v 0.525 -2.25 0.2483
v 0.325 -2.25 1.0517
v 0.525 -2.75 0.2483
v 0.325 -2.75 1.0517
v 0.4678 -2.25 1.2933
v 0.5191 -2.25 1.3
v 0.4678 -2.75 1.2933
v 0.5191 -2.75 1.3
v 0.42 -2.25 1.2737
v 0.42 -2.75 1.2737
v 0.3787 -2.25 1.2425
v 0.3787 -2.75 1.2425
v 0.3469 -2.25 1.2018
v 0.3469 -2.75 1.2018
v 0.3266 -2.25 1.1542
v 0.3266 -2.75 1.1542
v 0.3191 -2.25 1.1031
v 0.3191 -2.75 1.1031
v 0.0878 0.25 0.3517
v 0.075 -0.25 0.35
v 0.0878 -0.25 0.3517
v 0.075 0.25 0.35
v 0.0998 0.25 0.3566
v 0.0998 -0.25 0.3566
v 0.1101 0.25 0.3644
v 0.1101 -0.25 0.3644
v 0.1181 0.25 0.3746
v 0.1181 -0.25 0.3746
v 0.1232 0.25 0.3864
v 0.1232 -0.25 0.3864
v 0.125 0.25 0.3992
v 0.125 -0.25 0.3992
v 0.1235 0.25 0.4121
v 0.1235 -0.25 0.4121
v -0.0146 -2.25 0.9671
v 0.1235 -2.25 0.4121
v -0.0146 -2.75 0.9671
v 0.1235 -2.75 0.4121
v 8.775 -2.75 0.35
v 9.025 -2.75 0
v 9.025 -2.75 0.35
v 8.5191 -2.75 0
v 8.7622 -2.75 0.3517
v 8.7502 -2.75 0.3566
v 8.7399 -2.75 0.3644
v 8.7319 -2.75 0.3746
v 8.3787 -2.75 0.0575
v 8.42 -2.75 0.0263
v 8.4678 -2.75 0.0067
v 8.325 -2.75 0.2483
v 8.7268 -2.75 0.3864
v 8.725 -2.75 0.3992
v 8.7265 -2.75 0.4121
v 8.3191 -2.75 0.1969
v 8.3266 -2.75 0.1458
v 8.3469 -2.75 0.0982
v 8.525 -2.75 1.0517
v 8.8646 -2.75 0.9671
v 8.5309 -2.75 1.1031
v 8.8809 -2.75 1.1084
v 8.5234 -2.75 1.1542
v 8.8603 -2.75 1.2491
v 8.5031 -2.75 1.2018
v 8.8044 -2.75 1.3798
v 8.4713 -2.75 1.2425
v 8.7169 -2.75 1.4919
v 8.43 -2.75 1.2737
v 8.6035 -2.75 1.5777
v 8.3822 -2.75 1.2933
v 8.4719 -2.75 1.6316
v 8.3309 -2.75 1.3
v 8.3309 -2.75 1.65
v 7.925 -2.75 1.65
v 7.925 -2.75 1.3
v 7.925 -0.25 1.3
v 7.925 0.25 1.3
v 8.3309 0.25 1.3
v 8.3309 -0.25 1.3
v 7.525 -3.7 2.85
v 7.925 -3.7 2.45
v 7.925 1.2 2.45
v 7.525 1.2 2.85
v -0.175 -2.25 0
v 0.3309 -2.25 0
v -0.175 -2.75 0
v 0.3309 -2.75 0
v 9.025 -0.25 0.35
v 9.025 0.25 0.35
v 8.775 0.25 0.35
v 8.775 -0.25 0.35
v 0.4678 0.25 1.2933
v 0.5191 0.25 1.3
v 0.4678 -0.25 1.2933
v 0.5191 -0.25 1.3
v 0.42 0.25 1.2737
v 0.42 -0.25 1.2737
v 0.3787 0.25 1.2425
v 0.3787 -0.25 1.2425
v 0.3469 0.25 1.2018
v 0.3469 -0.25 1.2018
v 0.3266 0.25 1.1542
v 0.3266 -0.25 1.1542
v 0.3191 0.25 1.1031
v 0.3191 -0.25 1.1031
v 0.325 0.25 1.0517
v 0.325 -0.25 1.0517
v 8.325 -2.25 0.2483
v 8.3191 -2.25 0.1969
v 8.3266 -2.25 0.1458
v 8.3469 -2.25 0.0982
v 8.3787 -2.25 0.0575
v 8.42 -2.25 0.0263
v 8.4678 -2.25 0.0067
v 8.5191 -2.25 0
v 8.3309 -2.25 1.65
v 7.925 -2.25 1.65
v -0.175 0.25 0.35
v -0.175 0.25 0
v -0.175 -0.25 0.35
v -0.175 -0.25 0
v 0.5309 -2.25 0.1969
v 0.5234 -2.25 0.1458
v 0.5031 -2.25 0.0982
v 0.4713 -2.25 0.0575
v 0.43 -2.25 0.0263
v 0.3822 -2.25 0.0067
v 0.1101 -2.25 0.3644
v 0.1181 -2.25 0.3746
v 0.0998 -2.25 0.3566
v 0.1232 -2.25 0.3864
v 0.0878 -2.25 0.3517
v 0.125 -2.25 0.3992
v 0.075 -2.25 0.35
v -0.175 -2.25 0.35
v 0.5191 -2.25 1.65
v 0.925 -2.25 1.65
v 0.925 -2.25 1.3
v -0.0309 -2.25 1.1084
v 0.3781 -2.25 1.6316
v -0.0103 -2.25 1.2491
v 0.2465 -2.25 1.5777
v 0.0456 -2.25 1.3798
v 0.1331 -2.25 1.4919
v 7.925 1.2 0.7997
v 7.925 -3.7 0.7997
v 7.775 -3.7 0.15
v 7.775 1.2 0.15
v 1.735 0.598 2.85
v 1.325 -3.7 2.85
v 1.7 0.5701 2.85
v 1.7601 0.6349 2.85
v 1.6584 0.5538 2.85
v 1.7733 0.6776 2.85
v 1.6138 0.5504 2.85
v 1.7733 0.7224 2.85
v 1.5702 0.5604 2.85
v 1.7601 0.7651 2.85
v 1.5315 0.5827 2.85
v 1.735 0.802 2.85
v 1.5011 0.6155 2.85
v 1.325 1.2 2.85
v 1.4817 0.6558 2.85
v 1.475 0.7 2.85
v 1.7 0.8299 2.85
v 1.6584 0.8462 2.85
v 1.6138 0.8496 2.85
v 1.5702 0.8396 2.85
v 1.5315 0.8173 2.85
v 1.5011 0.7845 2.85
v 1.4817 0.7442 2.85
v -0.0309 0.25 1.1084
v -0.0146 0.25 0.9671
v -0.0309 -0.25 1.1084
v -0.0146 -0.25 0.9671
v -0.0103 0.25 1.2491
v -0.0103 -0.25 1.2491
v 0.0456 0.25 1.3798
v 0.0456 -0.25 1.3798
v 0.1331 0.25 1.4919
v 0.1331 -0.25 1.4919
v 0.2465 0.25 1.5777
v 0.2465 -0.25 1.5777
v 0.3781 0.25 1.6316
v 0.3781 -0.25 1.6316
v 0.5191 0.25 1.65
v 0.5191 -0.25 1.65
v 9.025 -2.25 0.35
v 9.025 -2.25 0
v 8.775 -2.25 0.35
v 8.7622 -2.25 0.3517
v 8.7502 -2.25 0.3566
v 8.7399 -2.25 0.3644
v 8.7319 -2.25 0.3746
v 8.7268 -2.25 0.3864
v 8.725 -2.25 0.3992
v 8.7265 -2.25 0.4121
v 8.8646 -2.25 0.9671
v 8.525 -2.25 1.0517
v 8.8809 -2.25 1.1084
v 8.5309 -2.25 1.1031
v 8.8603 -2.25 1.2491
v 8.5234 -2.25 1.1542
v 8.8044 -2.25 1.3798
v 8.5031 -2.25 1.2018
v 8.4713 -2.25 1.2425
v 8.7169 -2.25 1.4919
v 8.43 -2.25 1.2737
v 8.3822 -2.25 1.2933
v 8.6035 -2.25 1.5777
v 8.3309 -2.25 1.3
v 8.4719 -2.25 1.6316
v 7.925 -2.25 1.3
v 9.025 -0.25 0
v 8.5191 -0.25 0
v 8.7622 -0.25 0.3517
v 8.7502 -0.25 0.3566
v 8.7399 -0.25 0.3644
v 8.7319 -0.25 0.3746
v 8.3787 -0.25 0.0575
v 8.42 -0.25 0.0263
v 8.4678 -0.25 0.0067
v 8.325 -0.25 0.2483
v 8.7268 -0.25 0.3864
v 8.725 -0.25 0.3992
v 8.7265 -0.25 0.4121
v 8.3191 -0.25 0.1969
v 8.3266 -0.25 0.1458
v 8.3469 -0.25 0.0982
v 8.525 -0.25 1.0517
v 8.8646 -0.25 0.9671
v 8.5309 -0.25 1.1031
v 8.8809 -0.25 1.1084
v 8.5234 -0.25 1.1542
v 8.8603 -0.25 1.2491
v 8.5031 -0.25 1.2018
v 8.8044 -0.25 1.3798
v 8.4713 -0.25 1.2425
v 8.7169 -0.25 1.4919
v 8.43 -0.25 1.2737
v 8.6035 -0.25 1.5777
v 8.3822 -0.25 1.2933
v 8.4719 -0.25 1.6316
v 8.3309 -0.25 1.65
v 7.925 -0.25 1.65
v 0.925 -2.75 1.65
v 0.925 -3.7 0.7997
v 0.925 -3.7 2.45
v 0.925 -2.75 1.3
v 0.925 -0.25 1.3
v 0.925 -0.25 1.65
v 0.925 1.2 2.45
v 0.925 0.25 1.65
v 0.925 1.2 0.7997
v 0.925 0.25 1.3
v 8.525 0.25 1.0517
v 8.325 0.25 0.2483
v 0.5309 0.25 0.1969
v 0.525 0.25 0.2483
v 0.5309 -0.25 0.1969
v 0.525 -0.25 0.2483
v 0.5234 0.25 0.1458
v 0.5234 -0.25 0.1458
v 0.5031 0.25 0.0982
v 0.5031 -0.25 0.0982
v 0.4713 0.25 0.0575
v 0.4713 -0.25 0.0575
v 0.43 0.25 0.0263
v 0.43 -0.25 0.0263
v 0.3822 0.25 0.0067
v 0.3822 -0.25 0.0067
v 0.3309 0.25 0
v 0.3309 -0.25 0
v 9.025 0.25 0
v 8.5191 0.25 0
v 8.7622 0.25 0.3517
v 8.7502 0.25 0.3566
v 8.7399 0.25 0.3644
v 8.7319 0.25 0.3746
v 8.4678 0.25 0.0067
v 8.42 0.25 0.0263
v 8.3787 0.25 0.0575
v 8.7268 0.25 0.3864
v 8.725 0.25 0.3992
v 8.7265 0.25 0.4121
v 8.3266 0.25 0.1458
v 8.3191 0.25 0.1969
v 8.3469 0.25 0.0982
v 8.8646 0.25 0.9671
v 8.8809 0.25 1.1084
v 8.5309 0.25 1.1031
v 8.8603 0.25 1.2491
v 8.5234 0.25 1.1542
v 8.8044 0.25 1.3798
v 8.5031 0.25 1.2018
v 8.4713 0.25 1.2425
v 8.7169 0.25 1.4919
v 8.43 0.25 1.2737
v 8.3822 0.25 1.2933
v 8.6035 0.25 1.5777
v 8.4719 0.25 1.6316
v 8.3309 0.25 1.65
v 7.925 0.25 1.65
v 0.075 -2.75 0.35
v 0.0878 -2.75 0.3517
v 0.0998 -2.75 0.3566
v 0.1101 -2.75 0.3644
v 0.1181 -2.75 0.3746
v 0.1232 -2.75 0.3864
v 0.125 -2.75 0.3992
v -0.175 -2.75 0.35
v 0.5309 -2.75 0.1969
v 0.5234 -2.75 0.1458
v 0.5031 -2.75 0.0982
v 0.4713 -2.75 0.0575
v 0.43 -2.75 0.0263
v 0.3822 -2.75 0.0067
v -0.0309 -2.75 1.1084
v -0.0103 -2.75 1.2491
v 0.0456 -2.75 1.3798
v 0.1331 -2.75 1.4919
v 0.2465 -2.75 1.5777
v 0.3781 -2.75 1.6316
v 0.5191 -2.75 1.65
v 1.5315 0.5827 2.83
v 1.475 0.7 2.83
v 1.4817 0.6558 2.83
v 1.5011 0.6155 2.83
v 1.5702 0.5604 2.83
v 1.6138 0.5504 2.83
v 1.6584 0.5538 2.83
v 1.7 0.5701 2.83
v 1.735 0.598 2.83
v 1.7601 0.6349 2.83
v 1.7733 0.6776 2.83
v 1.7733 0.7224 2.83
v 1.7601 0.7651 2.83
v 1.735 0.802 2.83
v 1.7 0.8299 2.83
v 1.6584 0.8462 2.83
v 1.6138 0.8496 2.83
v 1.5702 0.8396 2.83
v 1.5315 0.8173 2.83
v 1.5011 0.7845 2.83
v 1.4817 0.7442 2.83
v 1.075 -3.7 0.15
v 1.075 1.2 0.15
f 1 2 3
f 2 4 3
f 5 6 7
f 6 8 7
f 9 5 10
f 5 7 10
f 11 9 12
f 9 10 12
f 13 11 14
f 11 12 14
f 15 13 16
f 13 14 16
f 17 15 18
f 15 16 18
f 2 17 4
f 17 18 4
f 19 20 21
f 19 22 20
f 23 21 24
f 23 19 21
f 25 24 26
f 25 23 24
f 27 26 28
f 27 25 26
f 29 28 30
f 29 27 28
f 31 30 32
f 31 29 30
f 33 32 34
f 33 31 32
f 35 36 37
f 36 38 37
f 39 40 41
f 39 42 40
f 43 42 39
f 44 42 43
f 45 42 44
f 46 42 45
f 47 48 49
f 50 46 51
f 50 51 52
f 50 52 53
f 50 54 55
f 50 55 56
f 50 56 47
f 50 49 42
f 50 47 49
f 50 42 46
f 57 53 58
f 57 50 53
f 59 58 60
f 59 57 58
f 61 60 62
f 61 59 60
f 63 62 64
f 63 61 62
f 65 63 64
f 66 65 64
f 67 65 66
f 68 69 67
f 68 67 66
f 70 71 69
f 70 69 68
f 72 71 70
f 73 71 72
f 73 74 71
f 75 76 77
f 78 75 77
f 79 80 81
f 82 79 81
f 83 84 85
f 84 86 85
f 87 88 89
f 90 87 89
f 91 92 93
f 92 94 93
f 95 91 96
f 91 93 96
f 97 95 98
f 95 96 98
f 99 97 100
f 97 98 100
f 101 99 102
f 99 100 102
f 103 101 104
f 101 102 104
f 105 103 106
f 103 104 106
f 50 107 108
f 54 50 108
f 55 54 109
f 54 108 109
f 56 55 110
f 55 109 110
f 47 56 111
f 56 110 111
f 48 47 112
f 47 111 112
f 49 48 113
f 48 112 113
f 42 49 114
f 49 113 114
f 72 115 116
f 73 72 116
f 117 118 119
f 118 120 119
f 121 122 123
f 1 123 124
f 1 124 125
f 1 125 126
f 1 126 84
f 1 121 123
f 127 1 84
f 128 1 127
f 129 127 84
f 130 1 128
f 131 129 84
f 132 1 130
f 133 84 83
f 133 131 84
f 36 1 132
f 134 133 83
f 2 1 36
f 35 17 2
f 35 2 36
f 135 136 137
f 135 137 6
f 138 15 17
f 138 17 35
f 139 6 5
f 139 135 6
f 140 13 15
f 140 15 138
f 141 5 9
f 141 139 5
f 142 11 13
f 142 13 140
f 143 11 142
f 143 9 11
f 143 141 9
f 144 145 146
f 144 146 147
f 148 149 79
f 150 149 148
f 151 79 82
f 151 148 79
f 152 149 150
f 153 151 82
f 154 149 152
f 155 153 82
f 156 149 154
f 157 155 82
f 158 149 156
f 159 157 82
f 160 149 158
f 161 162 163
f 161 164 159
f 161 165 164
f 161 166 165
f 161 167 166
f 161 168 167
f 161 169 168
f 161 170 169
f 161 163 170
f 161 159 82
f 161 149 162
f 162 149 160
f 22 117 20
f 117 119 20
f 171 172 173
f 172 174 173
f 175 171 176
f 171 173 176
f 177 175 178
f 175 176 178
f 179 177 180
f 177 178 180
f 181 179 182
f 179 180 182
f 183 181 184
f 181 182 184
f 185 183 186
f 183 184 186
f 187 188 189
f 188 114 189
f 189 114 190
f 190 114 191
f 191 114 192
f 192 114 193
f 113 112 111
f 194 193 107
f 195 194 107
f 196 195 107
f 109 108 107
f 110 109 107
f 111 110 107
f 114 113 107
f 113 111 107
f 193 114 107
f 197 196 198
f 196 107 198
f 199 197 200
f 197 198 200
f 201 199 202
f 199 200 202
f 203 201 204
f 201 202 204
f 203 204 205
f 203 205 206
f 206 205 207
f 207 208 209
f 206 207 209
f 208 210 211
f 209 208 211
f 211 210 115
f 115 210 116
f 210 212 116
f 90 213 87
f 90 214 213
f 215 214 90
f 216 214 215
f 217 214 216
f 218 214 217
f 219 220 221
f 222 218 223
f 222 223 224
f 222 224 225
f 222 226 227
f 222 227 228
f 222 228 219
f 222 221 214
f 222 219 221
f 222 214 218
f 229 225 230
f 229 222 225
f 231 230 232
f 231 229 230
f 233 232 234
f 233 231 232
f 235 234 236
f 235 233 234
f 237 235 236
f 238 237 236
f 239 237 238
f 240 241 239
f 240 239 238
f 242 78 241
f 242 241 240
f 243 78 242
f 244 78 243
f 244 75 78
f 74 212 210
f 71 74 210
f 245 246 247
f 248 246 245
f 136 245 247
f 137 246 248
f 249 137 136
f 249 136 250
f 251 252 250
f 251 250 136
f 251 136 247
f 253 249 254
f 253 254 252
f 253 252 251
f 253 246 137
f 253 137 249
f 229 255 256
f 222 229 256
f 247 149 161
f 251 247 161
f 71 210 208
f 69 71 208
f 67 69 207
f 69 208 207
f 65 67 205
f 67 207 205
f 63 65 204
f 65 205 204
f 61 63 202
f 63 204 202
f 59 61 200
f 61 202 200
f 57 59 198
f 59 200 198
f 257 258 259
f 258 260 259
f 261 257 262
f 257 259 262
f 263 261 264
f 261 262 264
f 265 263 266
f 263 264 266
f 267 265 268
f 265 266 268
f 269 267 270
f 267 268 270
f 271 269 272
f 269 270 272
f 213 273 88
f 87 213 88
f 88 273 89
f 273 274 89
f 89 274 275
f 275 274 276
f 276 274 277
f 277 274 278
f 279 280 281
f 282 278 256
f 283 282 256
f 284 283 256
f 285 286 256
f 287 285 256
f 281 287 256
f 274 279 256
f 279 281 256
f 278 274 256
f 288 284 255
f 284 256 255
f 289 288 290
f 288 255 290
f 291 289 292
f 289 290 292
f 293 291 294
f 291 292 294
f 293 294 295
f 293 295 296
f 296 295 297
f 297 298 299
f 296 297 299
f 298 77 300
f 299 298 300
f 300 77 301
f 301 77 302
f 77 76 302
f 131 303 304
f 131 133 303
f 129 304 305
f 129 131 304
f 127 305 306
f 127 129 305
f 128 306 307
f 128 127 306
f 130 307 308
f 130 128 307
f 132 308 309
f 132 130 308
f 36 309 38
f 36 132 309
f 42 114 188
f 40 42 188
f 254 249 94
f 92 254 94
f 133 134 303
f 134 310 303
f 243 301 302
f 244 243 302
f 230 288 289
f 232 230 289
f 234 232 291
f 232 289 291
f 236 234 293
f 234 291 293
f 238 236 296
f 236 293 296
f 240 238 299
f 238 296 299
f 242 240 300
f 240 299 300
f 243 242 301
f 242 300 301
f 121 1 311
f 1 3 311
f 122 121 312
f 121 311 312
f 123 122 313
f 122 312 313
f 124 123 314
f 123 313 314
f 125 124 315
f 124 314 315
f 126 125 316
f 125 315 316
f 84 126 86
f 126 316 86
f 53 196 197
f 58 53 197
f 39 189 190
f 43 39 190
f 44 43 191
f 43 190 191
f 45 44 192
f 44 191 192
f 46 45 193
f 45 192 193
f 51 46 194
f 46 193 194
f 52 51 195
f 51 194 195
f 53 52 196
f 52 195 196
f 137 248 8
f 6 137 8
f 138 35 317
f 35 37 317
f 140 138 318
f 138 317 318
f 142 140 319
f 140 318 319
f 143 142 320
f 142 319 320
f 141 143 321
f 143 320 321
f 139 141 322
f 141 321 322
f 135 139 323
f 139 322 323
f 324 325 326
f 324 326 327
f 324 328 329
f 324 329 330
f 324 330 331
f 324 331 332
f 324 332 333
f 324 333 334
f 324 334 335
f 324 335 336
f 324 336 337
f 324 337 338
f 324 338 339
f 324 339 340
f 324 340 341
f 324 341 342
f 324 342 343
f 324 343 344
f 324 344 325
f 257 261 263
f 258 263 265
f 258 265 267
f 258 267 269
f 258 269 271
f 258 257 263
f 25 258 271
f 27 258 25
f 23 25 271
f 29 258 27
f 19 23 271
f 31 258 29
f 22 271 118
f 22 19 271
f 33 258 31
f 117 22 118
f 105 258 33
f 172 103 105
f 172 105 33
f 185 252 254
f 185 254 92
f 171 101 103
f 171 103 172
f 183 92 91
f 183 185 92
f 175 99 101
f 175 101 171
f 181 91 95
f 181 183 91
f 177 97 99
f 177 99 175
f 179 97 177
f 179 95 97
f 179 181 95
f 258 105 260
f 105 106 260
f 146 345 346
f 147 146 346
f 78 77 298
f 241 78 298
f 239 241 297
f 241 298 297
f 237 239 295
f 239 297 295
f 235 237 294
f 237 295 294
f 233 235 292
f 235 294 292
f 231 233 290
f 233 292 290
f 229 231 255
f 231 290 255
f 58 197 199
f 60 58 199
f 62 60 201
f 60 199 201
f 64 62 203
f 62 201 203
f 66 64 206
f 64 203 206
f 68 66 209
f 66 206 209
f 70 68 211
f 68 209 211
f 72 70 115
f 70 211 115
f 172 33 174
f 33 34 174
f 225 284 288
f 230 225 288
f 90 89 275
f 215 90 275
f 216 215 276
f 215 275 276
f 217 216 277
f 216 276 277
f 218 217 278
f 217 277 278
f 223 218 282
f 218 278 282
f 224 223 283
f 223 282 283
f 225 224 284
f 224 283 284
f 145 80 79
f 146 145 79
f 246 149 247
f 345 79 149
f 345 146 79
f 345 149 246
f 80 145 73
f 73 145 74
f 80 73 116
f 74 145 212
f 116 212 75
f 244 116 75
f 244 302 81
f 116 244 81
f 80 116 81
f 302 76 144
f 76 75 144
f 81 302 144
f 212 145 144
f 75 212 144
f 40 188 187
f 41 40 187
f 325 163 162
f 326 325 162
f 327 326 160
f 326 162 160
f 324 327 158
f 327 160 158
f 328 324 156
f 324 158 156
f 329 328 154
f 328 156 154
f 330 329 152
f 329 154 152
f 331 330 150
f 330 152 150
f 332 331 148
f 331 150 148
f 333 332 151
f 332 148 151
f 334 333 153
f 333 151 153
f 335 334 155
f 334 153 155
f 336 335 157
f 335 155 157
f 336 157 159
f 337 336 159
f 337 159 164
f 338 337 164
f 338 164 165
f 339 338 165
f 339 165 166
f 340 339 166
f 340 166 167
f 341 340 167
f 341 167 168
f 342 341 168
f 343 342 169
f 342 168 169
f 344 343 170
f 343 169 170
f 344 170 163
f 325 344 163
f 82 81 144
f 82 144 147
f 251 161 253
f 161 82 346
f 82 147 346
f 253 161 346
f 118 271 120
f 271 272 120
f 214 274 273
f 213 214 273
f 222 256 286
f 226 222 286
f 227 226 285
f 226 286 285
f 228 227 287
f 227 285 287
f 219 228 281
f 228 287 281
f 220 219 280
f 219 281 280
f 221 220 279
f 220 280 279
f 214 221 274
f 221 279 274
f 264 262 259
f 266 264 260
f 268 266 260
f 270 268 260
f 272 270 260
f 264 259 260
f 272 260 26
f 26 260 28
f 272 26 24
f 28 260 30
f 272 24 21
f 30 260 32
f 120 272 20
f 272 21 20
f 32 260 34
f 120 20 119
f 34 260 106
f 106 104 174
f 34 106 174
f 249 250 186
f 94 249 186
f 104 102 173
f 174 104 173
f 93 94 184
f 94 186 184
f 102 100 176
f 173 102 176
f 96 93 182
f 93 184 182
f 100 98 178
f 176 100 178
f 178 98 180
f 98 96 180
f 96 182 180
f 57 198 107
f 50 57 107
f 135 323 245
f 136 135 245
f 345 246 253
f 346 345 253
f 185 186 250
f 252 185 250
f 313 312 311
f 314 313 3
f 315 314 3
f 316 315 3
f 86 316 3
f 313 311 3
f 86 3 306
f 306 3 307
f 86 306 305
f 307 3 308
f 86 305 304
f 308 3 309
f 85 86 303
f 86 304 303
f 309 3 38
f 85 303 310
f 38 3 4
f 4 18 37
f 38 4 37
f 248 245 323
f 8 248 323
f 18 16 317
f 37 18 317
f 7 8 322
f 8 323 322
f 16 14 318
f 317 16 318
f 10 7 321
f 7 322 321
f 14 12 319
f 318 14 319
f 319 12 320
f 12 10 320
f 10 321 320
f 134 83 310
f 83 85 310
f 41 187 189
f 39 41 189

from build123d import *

# Parameters (mm, degrees)
SKETCH_2_W                     = 4.9
SKETCH_2_H                     = 7
EXTRUDE_1_DEPTH                = 2.7
EXTRUDE_2_DEPTH                = 0.25
FILLET_1_R                     = 0.05
CHAMFER_1_SIZE                 = 0.4
PATTERN_LINEAR_2_COUNT         = 2
PATTERN_LINEAR_2_PITCH         = 2.5
FILLET_1_OF_PATTERN_LINEAR_2_R = 0.05
MIRROR_START                   = -1.5
MIRROR_1_DEPTH                 = 0.5
MIRROR_START_2                 = 1
MIRROR_1_2_DEPTH               = 0.5
CHAMFER_2_SIZE                 = 0.4
CHAMFER_3_SIZE                 = 0.15
CHAMFER_3_SIZE2                = 0.649721381
CHAMFER_4_SIZE                 = 0.15
CHAMFER_4_SIZE2                = 0.649721381
SKETCH_7_R                     = 0.15
CUT_EXTRUDE_2_DEPTH            = 0.02
MOVE_BODY_2_ANGLE              = 120


with BuildPart() as part:
    # Эскиз2 → Бобышка-Вытянуть1 (new body)
    with BuildSketch(Plane(origin=(0, 0.15, 0), x_dir=(-1, 0, 0), z_dir=(0, 1, 0))):
        Rectangle(SKETCH_2_W, SKETCH_2_H)
    extrude(amount=EXTRUDE_1_DEPTH)

    # Эскиз4 → Вытянуть-Тонкостенный2 (add, symmetric)
    with BuildSketch(Plane(origin=(1.25, 0, 0), x_dir=(0, 0, -1), z_dir=(1, 0, 0))):
        with BuildLine():
            Line((-3.5, 1.3), (-3.905923723, 1.3))
            ThreePointArc((-3.905923723, 1.3), (-4.063504056, 1.223160215), (-4.1, 1.051684386))
            Line((-4.1, 1.051684386), (-3.9, 0.248315614))
            ThreePointArc((-3.9, 0.248315614), (-3.936495944, 0.076839785), (-4.094076277, 0))
            Line((-4.094076277, 0), (-4.6, 0))
            Line((-4.6, 0), (-4.6, 0.35))
            Line((-4.6, 0.35), (-4.285997426, 0.35))
            Line((-4.285997426, 0.35), (-4.439633485, 0.967132062))
            ThreePointArc((-4.439633485, 0.967132062), (-4.339269639, 1.438690592), (-3.905923723, 1.65))
            Line((-3.905923723, 1.65), (-3.5, 1.65))
            Line((-3.5, 1.65), (-3.5, 1.3))
        make_face()
    extrude_2 = extrude(amount=EXTRUDE_2_DEPTH, both=True)

    # Скругление1
    fillet_1_edges = [part.edges().sort_by_distance(p)[0] for p in [
        (1.25, 0.35, 4.285997426),
    ]]
    fillet(fillet_1_edges, radius=FILLET_1_R)

    # Фаска1
    chamfer_1_edges = [part.edges().sort_by_distance(p)[0] for p in [
        (0, 2.85, 3.5),
    ]]
    chamfer(chamfer_1_edges, length=CHAMFER_1_SIZE)

    # Линейный массив2: Вытянуть-Тонкостенный2 ×2
    with Locations(*[(-i * PATTERN_LINEAR_2_PITCH, 0, 0) for i in range(1, PATTERN_LINEAR_2_COUNT)]):
        add(extrude_2)

    # Скругление1 of Линейный массив2
    fillet_1_of_pattern_linear_2_edges = [part.edges().sort_by_distance(p)[0] for p in [
        (-1.25, 0.35, 4.285997426),
    ]]
    fillet(fillet_1_of_pattern_linear_2_edges, radius=FILLET_1_OF_PATTERN_LINEAR_2_R)

    # Зеркальное отражение1: read off the stored shape, not the designer's step
    # Зеркальное отражение1 outline → Зеркальное отражение1 (add)
    with BuildSketch(Plane.YZ.offset(MIRROR_START)):
        with BuildLine():
            Line((0, -4.6), (0.35, -4.6))
            Line((0.35, -4.6), (0.35, -4.349971142))
            ThreePointArc((0.35, -4.349971142), (0.369209946, -4.310576059), (0.412078903, -4.301452073))
            Line((0.412078903, -4.301452073), (0.967132062, -4.439633485))
            ThreePointArc((0.967132062, -4.439633485), (1.438690592, -4.339269639), (1.65, -3.905923723))
            Line((1.65, -3.905923723), (1.65, -3.5))
            Line((1.65, -3.5), (1.3, -3.5))
            Line((1.3, -3.5), (1.3, -3.905923723))
            ThreePointArc((1.3, -3.905923723), (1.223160215, -4.063504056), (1.051684386, -4.1))
            Line((1.051684386, -4.1), (0.248315614, -3.9))
            ThreePointArc((0.248315614, -3.9), (0.076839785, -3.936495944), (0, -4.094076277))
            Line((0, -4.094076277), (0, -4.6))
        make_face()
    extrude(amount=MIRROR_1_DEPTH)

    # Mirror 1 2 outline → Mirror 1 2 (add)
    with BuildSketch(Plane.YZ.offset(MIRROR_START_2)):
        with BuildLine():
            Line((0, -4.6), (0.35, -4.6))
            Line((0.35, -4.6), (0.35, -4.349971142))
            ThreePointArc((0.35, -4.349971142), (0.369209946, -4.310576059), (0.412078903, -4.301452073))
            Line((0.412078903, -4.301452073), (0.967132062, -4.439633485))
            ThreePointArc((0.967132062, -4.439633485), (1.438690592, -4.339269639), (1.65, -3.905923723))
            Line((1.65, -3.905923723), (1.65, -3.5))
            Line((1.65, -3.5), (1.3, -3.5))
            Line((1.3, -3.5), (1.3, -3.905923723))
            ThreePointArc((1.3, -3.905923723), (1.223160215, -4.063504056), (1.051684386, -4.1))
            Line((1.051684386, -4.1), (0.248315614, -3.9))
            ThreePointArc((0.248315614, -3.9), (0.076839785, -3.936495944), (0, -4.094076277))
            Line((0, -4.094076277), (0, -4.6))
        make_face()
    extrude(amount=MIRROR_1_2_DEPTH)

    # Фаска2
    chamfer_2_edges = [part.edges().sort_by_distance(p)[0] for p in [
        (0, 2.85, -3.5),
    ]]
    chamfer(chamfer_2_edges, length=CHAMFER_2_SIZE)

    # Фаска3
    chamfer_3_edges = [part.edges().sort_by_distance(p)[0] for p in [
        (0, 0.15, -3.5),
    ]]
    chamfer_3_side = [part.faces().sort_by_distance(p)[0] for p in [
        (0, 0.15, 0),
    ]]
    chamfer(chamfer_3_edges, length=CHAMFER_3_SIZE, length2=CHAMFER_3_SIZE2, reference=chamfer_3_side[0])

    # Фаска4
    chamfer_4_edges = [part.edges().sort_by_distance(p)[0] for p in [
        (0, 0.15, 3.5),
    ]]
    chamfer_4_side = [part.faces().sort_by_distance(p)[0] for p in [
        (0, 0.15, 0.075),
    ]]
    chamfer(chamfer_4_edges, length=CHAMFER_4_SIZE, length2=CHAMFER_4_SIZE2, reference=chamfer_4_side[0])

    # Эскиз7 → Вырез-Вытянуть2 (cut)
    with BuildSketch(Plane(origin=(0, 2.85, 0), x_dir=(1, 0, 0), z_dir=(0, 1, 0))):
        with Locations(Location((-1.95, -2.8, 0), (0, 0, 270))):
            Circle(SKETCH_7_R)
    extrude(amount=-CUT_EXTRUDE_2_DEPTH, mode=Mode.SUBTRACT)


with BuildPart() as part_1:
    # Move Body 2: read off the stored shape, not the designer's step
    # Move Body 2: moved
    add(part.part.moved(Location((1.25, 0, -4.425))).rotate(Axis((0, 0, 0), (0.5773502692, -0.5773502692, -0.5773502692)), MOVE_BODY_2_ANGLE))


solid = part_1.part
